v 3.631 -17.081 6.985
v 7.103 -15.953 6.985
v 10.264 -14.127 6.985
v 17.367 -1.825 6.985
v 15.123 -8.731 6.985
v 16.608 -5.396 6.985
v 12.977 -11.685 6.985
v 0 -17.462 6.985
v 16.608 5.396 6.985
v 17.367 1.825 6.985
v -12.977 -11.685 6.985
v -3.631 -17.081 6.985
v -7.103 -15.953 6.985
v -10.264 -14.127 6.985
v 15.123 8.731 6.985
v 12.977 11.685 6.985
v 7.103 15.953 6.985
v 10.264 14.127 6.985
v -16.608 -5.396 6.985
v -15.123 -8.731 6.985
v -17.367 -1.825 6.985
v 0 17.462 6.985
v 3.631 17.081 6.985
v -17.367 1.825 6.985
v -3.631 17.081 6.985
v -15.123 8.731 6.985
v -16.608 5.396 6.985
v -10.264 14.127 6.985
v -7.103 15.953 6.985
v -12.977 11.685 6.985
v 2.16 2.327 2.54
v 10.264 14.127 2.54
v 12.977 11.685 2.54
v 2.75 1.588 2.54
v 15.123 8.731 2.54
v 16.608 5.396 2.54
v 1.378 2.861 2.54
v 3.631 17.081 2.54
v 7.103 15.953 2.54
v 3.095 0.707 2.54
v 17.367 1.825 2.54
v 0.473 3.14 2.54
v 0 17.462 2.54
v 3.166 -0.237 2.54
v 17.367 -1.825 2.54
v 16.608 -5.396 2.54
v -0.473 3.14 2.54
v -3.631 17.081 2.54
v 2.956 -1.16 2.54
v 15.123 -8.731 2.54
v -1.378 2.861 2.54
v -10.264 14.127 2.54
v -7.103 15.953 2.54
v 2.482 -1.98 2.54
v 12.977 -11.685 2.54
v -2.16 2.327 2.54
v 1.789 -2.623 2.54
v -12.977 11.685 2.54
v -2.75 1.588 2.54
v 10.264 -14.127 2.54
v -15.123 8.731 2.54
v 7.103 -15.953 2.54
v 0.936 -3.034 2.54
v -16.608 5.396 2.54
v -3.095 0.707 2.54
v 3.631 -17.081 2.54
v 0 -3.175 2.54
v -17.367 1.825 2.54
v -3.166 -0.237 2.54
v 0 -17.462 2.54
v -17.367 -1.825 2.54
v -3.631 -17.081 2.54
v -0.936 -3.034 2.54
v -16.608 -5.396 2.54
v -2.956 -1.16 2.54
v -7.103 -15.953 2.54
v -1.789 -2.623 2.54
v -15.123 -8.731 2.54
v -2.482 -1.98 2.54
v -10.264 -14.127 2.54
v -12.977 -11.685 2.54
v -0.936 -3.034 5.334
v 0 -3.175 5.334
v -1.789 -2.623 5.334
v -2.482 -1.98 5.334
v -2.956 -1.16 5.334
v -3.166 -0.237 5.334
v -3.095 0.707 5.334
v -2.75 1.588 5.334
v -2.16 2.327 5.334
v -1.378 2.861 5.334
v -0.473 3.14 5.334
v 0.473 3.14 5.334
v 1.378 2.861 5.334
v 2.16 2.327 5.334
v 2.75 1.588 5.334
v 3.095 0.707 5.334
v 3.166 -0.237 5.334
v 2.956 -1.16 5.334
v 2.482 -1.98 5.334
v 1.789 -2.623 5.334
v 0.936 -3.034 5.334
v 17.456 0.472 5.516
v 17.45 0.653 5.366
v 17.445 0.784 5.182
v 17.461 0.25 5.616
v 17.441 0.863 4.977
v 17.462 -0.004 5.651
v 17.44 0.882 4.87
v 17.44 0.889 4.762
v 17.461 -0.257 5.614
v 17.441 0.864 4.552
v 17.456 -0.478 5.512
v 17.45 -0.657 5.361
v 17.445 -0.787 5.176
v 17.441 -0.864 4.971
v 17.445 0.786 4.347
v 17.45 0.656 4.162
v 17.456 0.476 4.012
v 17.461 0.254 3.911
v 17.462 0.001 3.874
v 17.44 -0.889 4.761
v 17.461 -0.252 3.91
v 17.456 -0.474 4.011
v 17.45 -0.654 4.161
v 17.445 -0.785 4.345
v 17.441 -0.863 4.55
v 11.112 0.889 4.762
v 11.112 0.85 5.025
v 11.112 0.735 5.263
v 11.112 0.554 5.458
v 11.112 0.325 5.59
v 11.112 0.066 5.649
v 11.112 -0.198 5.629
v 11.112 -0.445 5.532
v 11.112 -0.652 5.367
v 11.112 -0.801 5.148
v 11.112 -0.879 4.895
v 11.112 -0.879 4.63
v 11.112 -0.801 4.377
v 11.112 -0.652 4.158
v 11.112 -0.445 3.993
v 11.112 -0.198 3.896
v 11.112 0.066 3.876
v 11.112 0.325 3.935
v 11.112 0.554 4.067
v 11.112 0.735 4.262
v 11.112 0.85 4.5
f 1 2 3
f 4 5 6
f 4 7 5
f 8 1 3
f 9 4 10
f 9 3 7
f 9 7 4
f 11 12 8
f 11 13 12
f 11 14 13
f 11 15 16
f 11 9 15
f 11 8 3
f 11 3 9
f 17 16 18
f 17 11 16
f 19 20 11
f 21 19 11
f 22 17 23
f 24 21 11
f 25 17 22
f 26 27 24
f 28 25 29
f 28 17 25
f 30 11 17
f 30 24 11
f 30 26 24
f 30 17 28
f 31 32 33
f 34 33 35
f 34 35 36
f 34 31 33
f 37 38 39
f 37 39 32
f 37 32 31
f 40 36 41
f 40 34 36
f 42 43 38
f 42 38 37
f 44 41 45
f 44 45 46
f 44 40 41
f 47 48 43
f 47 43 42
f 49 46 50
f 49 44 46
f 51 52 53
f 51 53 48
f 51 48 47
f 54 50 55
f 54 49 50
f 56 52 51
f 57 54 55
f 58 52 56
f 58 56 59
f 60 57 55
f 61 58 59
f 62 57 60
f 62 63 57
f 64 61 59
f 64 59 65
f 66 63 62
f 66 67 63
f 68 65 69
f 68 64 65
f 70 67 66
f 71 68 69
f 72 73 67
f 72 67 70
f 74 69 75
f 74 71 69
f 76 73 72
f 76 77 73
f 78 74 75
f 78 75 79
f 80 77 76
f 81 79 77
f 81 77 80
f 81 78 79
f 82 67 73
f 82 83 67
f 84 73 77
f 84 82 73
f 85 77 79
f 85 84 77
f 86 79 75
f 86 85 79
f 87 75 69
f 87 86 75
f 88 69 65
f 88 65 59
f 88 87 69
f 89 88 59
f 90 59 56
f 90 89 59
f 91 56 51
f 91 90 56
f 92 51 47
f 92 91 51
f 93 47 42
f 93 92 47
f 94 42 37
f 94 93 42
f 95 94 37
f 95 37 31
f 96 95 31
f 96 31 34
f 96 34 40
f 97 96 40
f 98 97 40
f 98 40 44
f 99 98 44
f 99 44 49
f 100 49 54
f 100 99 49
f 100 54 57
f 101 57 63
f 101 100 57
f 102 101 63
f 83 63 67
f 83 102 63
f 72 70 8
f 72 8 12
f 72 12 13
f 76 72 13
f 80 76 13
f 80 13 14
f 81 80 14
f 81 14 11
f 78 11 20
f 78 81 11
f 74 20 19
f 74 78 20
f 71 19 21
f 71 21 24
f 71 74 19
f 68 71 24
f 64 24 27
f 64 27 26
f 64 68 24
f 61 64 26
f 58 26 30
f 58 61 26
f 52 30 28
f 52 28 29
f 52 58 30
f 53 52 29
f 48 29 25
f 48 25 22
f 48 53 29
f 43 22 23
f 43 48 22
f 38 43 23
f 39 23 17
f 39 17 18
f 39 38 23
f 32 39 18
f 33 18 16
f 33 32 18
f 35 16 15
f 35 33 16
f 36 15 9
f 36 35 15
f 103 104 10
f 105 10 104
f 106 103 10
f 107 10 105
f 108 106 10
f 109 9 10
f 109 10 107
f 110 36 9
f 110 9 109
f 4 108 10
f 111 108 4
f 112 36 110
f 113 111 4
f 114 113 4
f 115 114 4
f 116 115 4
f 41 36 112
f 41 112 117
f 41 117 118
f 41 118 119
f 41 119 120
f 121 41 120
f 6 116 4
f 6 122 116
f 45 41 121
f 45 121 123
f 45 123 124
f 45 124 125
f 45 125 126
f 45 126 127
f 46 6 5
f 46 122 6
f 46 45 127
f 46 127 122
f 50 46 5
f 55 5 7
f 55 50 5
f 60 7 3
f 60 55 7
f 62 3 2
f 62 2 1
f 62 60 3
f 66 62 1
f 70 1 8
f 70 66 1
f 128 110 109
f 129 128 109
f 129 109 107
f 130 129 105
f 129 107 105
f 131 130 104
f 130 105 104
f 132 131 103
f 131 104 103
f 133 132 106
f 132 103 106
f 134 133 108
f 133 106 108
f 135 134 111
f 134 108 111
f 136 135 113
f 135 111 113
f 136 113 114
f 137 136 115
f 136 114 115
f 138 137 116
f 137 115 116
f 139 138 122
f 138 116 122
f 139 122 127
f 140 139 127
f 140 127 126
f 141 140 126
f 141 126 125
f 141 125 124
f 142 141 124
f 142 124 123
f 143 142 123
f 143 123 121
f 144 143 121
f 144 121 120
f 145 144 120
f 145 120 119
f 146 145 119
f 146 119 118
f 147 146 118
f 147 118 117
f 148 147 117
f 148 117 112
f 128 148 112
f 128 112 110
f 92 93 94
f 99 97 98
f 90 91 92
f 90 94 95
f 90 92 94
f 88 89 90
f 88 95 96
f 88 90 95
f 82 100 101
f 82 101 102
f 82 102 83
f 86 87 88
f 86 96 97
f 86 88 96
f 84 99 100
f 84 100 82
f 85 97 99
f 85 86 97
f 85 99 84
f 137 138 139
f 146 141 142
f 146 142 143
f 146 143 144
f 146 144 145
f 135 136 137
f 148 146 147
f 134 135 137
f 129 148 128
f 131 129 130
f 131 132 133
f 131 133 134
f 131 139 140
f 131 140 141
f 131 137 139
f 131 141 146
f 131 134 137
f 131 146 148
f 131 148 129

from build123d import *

# Parameters (mm, degrees)
F3_R     = 0.889
F4_DEPTH = 6.35


with BuildPart() as f1:
    # F0 (on Right) → F1 (revolve)
    with BuildSketch(Plane.YZ):
        Polygon((-17.4625, 2.54), (-3.175, 2.54), (-3.175, 5.334), (0, 5.334), (0, 6.985), (-17.4625, 6.985), align=None)
    revolve(axis=Axis((0, 0, 6.1595), (0, 0, -1)))

    # F3 (on offset) → F4 (cut)
    with BuildSketch(Plane.YZ.offset(17.4625)):
        with Locations((0, 4.7625)):
            Circle(F3_R)
    extrude(amount=-F4_DEPTH, mode=Mode.SUBTRACT)


solid = f1.part
